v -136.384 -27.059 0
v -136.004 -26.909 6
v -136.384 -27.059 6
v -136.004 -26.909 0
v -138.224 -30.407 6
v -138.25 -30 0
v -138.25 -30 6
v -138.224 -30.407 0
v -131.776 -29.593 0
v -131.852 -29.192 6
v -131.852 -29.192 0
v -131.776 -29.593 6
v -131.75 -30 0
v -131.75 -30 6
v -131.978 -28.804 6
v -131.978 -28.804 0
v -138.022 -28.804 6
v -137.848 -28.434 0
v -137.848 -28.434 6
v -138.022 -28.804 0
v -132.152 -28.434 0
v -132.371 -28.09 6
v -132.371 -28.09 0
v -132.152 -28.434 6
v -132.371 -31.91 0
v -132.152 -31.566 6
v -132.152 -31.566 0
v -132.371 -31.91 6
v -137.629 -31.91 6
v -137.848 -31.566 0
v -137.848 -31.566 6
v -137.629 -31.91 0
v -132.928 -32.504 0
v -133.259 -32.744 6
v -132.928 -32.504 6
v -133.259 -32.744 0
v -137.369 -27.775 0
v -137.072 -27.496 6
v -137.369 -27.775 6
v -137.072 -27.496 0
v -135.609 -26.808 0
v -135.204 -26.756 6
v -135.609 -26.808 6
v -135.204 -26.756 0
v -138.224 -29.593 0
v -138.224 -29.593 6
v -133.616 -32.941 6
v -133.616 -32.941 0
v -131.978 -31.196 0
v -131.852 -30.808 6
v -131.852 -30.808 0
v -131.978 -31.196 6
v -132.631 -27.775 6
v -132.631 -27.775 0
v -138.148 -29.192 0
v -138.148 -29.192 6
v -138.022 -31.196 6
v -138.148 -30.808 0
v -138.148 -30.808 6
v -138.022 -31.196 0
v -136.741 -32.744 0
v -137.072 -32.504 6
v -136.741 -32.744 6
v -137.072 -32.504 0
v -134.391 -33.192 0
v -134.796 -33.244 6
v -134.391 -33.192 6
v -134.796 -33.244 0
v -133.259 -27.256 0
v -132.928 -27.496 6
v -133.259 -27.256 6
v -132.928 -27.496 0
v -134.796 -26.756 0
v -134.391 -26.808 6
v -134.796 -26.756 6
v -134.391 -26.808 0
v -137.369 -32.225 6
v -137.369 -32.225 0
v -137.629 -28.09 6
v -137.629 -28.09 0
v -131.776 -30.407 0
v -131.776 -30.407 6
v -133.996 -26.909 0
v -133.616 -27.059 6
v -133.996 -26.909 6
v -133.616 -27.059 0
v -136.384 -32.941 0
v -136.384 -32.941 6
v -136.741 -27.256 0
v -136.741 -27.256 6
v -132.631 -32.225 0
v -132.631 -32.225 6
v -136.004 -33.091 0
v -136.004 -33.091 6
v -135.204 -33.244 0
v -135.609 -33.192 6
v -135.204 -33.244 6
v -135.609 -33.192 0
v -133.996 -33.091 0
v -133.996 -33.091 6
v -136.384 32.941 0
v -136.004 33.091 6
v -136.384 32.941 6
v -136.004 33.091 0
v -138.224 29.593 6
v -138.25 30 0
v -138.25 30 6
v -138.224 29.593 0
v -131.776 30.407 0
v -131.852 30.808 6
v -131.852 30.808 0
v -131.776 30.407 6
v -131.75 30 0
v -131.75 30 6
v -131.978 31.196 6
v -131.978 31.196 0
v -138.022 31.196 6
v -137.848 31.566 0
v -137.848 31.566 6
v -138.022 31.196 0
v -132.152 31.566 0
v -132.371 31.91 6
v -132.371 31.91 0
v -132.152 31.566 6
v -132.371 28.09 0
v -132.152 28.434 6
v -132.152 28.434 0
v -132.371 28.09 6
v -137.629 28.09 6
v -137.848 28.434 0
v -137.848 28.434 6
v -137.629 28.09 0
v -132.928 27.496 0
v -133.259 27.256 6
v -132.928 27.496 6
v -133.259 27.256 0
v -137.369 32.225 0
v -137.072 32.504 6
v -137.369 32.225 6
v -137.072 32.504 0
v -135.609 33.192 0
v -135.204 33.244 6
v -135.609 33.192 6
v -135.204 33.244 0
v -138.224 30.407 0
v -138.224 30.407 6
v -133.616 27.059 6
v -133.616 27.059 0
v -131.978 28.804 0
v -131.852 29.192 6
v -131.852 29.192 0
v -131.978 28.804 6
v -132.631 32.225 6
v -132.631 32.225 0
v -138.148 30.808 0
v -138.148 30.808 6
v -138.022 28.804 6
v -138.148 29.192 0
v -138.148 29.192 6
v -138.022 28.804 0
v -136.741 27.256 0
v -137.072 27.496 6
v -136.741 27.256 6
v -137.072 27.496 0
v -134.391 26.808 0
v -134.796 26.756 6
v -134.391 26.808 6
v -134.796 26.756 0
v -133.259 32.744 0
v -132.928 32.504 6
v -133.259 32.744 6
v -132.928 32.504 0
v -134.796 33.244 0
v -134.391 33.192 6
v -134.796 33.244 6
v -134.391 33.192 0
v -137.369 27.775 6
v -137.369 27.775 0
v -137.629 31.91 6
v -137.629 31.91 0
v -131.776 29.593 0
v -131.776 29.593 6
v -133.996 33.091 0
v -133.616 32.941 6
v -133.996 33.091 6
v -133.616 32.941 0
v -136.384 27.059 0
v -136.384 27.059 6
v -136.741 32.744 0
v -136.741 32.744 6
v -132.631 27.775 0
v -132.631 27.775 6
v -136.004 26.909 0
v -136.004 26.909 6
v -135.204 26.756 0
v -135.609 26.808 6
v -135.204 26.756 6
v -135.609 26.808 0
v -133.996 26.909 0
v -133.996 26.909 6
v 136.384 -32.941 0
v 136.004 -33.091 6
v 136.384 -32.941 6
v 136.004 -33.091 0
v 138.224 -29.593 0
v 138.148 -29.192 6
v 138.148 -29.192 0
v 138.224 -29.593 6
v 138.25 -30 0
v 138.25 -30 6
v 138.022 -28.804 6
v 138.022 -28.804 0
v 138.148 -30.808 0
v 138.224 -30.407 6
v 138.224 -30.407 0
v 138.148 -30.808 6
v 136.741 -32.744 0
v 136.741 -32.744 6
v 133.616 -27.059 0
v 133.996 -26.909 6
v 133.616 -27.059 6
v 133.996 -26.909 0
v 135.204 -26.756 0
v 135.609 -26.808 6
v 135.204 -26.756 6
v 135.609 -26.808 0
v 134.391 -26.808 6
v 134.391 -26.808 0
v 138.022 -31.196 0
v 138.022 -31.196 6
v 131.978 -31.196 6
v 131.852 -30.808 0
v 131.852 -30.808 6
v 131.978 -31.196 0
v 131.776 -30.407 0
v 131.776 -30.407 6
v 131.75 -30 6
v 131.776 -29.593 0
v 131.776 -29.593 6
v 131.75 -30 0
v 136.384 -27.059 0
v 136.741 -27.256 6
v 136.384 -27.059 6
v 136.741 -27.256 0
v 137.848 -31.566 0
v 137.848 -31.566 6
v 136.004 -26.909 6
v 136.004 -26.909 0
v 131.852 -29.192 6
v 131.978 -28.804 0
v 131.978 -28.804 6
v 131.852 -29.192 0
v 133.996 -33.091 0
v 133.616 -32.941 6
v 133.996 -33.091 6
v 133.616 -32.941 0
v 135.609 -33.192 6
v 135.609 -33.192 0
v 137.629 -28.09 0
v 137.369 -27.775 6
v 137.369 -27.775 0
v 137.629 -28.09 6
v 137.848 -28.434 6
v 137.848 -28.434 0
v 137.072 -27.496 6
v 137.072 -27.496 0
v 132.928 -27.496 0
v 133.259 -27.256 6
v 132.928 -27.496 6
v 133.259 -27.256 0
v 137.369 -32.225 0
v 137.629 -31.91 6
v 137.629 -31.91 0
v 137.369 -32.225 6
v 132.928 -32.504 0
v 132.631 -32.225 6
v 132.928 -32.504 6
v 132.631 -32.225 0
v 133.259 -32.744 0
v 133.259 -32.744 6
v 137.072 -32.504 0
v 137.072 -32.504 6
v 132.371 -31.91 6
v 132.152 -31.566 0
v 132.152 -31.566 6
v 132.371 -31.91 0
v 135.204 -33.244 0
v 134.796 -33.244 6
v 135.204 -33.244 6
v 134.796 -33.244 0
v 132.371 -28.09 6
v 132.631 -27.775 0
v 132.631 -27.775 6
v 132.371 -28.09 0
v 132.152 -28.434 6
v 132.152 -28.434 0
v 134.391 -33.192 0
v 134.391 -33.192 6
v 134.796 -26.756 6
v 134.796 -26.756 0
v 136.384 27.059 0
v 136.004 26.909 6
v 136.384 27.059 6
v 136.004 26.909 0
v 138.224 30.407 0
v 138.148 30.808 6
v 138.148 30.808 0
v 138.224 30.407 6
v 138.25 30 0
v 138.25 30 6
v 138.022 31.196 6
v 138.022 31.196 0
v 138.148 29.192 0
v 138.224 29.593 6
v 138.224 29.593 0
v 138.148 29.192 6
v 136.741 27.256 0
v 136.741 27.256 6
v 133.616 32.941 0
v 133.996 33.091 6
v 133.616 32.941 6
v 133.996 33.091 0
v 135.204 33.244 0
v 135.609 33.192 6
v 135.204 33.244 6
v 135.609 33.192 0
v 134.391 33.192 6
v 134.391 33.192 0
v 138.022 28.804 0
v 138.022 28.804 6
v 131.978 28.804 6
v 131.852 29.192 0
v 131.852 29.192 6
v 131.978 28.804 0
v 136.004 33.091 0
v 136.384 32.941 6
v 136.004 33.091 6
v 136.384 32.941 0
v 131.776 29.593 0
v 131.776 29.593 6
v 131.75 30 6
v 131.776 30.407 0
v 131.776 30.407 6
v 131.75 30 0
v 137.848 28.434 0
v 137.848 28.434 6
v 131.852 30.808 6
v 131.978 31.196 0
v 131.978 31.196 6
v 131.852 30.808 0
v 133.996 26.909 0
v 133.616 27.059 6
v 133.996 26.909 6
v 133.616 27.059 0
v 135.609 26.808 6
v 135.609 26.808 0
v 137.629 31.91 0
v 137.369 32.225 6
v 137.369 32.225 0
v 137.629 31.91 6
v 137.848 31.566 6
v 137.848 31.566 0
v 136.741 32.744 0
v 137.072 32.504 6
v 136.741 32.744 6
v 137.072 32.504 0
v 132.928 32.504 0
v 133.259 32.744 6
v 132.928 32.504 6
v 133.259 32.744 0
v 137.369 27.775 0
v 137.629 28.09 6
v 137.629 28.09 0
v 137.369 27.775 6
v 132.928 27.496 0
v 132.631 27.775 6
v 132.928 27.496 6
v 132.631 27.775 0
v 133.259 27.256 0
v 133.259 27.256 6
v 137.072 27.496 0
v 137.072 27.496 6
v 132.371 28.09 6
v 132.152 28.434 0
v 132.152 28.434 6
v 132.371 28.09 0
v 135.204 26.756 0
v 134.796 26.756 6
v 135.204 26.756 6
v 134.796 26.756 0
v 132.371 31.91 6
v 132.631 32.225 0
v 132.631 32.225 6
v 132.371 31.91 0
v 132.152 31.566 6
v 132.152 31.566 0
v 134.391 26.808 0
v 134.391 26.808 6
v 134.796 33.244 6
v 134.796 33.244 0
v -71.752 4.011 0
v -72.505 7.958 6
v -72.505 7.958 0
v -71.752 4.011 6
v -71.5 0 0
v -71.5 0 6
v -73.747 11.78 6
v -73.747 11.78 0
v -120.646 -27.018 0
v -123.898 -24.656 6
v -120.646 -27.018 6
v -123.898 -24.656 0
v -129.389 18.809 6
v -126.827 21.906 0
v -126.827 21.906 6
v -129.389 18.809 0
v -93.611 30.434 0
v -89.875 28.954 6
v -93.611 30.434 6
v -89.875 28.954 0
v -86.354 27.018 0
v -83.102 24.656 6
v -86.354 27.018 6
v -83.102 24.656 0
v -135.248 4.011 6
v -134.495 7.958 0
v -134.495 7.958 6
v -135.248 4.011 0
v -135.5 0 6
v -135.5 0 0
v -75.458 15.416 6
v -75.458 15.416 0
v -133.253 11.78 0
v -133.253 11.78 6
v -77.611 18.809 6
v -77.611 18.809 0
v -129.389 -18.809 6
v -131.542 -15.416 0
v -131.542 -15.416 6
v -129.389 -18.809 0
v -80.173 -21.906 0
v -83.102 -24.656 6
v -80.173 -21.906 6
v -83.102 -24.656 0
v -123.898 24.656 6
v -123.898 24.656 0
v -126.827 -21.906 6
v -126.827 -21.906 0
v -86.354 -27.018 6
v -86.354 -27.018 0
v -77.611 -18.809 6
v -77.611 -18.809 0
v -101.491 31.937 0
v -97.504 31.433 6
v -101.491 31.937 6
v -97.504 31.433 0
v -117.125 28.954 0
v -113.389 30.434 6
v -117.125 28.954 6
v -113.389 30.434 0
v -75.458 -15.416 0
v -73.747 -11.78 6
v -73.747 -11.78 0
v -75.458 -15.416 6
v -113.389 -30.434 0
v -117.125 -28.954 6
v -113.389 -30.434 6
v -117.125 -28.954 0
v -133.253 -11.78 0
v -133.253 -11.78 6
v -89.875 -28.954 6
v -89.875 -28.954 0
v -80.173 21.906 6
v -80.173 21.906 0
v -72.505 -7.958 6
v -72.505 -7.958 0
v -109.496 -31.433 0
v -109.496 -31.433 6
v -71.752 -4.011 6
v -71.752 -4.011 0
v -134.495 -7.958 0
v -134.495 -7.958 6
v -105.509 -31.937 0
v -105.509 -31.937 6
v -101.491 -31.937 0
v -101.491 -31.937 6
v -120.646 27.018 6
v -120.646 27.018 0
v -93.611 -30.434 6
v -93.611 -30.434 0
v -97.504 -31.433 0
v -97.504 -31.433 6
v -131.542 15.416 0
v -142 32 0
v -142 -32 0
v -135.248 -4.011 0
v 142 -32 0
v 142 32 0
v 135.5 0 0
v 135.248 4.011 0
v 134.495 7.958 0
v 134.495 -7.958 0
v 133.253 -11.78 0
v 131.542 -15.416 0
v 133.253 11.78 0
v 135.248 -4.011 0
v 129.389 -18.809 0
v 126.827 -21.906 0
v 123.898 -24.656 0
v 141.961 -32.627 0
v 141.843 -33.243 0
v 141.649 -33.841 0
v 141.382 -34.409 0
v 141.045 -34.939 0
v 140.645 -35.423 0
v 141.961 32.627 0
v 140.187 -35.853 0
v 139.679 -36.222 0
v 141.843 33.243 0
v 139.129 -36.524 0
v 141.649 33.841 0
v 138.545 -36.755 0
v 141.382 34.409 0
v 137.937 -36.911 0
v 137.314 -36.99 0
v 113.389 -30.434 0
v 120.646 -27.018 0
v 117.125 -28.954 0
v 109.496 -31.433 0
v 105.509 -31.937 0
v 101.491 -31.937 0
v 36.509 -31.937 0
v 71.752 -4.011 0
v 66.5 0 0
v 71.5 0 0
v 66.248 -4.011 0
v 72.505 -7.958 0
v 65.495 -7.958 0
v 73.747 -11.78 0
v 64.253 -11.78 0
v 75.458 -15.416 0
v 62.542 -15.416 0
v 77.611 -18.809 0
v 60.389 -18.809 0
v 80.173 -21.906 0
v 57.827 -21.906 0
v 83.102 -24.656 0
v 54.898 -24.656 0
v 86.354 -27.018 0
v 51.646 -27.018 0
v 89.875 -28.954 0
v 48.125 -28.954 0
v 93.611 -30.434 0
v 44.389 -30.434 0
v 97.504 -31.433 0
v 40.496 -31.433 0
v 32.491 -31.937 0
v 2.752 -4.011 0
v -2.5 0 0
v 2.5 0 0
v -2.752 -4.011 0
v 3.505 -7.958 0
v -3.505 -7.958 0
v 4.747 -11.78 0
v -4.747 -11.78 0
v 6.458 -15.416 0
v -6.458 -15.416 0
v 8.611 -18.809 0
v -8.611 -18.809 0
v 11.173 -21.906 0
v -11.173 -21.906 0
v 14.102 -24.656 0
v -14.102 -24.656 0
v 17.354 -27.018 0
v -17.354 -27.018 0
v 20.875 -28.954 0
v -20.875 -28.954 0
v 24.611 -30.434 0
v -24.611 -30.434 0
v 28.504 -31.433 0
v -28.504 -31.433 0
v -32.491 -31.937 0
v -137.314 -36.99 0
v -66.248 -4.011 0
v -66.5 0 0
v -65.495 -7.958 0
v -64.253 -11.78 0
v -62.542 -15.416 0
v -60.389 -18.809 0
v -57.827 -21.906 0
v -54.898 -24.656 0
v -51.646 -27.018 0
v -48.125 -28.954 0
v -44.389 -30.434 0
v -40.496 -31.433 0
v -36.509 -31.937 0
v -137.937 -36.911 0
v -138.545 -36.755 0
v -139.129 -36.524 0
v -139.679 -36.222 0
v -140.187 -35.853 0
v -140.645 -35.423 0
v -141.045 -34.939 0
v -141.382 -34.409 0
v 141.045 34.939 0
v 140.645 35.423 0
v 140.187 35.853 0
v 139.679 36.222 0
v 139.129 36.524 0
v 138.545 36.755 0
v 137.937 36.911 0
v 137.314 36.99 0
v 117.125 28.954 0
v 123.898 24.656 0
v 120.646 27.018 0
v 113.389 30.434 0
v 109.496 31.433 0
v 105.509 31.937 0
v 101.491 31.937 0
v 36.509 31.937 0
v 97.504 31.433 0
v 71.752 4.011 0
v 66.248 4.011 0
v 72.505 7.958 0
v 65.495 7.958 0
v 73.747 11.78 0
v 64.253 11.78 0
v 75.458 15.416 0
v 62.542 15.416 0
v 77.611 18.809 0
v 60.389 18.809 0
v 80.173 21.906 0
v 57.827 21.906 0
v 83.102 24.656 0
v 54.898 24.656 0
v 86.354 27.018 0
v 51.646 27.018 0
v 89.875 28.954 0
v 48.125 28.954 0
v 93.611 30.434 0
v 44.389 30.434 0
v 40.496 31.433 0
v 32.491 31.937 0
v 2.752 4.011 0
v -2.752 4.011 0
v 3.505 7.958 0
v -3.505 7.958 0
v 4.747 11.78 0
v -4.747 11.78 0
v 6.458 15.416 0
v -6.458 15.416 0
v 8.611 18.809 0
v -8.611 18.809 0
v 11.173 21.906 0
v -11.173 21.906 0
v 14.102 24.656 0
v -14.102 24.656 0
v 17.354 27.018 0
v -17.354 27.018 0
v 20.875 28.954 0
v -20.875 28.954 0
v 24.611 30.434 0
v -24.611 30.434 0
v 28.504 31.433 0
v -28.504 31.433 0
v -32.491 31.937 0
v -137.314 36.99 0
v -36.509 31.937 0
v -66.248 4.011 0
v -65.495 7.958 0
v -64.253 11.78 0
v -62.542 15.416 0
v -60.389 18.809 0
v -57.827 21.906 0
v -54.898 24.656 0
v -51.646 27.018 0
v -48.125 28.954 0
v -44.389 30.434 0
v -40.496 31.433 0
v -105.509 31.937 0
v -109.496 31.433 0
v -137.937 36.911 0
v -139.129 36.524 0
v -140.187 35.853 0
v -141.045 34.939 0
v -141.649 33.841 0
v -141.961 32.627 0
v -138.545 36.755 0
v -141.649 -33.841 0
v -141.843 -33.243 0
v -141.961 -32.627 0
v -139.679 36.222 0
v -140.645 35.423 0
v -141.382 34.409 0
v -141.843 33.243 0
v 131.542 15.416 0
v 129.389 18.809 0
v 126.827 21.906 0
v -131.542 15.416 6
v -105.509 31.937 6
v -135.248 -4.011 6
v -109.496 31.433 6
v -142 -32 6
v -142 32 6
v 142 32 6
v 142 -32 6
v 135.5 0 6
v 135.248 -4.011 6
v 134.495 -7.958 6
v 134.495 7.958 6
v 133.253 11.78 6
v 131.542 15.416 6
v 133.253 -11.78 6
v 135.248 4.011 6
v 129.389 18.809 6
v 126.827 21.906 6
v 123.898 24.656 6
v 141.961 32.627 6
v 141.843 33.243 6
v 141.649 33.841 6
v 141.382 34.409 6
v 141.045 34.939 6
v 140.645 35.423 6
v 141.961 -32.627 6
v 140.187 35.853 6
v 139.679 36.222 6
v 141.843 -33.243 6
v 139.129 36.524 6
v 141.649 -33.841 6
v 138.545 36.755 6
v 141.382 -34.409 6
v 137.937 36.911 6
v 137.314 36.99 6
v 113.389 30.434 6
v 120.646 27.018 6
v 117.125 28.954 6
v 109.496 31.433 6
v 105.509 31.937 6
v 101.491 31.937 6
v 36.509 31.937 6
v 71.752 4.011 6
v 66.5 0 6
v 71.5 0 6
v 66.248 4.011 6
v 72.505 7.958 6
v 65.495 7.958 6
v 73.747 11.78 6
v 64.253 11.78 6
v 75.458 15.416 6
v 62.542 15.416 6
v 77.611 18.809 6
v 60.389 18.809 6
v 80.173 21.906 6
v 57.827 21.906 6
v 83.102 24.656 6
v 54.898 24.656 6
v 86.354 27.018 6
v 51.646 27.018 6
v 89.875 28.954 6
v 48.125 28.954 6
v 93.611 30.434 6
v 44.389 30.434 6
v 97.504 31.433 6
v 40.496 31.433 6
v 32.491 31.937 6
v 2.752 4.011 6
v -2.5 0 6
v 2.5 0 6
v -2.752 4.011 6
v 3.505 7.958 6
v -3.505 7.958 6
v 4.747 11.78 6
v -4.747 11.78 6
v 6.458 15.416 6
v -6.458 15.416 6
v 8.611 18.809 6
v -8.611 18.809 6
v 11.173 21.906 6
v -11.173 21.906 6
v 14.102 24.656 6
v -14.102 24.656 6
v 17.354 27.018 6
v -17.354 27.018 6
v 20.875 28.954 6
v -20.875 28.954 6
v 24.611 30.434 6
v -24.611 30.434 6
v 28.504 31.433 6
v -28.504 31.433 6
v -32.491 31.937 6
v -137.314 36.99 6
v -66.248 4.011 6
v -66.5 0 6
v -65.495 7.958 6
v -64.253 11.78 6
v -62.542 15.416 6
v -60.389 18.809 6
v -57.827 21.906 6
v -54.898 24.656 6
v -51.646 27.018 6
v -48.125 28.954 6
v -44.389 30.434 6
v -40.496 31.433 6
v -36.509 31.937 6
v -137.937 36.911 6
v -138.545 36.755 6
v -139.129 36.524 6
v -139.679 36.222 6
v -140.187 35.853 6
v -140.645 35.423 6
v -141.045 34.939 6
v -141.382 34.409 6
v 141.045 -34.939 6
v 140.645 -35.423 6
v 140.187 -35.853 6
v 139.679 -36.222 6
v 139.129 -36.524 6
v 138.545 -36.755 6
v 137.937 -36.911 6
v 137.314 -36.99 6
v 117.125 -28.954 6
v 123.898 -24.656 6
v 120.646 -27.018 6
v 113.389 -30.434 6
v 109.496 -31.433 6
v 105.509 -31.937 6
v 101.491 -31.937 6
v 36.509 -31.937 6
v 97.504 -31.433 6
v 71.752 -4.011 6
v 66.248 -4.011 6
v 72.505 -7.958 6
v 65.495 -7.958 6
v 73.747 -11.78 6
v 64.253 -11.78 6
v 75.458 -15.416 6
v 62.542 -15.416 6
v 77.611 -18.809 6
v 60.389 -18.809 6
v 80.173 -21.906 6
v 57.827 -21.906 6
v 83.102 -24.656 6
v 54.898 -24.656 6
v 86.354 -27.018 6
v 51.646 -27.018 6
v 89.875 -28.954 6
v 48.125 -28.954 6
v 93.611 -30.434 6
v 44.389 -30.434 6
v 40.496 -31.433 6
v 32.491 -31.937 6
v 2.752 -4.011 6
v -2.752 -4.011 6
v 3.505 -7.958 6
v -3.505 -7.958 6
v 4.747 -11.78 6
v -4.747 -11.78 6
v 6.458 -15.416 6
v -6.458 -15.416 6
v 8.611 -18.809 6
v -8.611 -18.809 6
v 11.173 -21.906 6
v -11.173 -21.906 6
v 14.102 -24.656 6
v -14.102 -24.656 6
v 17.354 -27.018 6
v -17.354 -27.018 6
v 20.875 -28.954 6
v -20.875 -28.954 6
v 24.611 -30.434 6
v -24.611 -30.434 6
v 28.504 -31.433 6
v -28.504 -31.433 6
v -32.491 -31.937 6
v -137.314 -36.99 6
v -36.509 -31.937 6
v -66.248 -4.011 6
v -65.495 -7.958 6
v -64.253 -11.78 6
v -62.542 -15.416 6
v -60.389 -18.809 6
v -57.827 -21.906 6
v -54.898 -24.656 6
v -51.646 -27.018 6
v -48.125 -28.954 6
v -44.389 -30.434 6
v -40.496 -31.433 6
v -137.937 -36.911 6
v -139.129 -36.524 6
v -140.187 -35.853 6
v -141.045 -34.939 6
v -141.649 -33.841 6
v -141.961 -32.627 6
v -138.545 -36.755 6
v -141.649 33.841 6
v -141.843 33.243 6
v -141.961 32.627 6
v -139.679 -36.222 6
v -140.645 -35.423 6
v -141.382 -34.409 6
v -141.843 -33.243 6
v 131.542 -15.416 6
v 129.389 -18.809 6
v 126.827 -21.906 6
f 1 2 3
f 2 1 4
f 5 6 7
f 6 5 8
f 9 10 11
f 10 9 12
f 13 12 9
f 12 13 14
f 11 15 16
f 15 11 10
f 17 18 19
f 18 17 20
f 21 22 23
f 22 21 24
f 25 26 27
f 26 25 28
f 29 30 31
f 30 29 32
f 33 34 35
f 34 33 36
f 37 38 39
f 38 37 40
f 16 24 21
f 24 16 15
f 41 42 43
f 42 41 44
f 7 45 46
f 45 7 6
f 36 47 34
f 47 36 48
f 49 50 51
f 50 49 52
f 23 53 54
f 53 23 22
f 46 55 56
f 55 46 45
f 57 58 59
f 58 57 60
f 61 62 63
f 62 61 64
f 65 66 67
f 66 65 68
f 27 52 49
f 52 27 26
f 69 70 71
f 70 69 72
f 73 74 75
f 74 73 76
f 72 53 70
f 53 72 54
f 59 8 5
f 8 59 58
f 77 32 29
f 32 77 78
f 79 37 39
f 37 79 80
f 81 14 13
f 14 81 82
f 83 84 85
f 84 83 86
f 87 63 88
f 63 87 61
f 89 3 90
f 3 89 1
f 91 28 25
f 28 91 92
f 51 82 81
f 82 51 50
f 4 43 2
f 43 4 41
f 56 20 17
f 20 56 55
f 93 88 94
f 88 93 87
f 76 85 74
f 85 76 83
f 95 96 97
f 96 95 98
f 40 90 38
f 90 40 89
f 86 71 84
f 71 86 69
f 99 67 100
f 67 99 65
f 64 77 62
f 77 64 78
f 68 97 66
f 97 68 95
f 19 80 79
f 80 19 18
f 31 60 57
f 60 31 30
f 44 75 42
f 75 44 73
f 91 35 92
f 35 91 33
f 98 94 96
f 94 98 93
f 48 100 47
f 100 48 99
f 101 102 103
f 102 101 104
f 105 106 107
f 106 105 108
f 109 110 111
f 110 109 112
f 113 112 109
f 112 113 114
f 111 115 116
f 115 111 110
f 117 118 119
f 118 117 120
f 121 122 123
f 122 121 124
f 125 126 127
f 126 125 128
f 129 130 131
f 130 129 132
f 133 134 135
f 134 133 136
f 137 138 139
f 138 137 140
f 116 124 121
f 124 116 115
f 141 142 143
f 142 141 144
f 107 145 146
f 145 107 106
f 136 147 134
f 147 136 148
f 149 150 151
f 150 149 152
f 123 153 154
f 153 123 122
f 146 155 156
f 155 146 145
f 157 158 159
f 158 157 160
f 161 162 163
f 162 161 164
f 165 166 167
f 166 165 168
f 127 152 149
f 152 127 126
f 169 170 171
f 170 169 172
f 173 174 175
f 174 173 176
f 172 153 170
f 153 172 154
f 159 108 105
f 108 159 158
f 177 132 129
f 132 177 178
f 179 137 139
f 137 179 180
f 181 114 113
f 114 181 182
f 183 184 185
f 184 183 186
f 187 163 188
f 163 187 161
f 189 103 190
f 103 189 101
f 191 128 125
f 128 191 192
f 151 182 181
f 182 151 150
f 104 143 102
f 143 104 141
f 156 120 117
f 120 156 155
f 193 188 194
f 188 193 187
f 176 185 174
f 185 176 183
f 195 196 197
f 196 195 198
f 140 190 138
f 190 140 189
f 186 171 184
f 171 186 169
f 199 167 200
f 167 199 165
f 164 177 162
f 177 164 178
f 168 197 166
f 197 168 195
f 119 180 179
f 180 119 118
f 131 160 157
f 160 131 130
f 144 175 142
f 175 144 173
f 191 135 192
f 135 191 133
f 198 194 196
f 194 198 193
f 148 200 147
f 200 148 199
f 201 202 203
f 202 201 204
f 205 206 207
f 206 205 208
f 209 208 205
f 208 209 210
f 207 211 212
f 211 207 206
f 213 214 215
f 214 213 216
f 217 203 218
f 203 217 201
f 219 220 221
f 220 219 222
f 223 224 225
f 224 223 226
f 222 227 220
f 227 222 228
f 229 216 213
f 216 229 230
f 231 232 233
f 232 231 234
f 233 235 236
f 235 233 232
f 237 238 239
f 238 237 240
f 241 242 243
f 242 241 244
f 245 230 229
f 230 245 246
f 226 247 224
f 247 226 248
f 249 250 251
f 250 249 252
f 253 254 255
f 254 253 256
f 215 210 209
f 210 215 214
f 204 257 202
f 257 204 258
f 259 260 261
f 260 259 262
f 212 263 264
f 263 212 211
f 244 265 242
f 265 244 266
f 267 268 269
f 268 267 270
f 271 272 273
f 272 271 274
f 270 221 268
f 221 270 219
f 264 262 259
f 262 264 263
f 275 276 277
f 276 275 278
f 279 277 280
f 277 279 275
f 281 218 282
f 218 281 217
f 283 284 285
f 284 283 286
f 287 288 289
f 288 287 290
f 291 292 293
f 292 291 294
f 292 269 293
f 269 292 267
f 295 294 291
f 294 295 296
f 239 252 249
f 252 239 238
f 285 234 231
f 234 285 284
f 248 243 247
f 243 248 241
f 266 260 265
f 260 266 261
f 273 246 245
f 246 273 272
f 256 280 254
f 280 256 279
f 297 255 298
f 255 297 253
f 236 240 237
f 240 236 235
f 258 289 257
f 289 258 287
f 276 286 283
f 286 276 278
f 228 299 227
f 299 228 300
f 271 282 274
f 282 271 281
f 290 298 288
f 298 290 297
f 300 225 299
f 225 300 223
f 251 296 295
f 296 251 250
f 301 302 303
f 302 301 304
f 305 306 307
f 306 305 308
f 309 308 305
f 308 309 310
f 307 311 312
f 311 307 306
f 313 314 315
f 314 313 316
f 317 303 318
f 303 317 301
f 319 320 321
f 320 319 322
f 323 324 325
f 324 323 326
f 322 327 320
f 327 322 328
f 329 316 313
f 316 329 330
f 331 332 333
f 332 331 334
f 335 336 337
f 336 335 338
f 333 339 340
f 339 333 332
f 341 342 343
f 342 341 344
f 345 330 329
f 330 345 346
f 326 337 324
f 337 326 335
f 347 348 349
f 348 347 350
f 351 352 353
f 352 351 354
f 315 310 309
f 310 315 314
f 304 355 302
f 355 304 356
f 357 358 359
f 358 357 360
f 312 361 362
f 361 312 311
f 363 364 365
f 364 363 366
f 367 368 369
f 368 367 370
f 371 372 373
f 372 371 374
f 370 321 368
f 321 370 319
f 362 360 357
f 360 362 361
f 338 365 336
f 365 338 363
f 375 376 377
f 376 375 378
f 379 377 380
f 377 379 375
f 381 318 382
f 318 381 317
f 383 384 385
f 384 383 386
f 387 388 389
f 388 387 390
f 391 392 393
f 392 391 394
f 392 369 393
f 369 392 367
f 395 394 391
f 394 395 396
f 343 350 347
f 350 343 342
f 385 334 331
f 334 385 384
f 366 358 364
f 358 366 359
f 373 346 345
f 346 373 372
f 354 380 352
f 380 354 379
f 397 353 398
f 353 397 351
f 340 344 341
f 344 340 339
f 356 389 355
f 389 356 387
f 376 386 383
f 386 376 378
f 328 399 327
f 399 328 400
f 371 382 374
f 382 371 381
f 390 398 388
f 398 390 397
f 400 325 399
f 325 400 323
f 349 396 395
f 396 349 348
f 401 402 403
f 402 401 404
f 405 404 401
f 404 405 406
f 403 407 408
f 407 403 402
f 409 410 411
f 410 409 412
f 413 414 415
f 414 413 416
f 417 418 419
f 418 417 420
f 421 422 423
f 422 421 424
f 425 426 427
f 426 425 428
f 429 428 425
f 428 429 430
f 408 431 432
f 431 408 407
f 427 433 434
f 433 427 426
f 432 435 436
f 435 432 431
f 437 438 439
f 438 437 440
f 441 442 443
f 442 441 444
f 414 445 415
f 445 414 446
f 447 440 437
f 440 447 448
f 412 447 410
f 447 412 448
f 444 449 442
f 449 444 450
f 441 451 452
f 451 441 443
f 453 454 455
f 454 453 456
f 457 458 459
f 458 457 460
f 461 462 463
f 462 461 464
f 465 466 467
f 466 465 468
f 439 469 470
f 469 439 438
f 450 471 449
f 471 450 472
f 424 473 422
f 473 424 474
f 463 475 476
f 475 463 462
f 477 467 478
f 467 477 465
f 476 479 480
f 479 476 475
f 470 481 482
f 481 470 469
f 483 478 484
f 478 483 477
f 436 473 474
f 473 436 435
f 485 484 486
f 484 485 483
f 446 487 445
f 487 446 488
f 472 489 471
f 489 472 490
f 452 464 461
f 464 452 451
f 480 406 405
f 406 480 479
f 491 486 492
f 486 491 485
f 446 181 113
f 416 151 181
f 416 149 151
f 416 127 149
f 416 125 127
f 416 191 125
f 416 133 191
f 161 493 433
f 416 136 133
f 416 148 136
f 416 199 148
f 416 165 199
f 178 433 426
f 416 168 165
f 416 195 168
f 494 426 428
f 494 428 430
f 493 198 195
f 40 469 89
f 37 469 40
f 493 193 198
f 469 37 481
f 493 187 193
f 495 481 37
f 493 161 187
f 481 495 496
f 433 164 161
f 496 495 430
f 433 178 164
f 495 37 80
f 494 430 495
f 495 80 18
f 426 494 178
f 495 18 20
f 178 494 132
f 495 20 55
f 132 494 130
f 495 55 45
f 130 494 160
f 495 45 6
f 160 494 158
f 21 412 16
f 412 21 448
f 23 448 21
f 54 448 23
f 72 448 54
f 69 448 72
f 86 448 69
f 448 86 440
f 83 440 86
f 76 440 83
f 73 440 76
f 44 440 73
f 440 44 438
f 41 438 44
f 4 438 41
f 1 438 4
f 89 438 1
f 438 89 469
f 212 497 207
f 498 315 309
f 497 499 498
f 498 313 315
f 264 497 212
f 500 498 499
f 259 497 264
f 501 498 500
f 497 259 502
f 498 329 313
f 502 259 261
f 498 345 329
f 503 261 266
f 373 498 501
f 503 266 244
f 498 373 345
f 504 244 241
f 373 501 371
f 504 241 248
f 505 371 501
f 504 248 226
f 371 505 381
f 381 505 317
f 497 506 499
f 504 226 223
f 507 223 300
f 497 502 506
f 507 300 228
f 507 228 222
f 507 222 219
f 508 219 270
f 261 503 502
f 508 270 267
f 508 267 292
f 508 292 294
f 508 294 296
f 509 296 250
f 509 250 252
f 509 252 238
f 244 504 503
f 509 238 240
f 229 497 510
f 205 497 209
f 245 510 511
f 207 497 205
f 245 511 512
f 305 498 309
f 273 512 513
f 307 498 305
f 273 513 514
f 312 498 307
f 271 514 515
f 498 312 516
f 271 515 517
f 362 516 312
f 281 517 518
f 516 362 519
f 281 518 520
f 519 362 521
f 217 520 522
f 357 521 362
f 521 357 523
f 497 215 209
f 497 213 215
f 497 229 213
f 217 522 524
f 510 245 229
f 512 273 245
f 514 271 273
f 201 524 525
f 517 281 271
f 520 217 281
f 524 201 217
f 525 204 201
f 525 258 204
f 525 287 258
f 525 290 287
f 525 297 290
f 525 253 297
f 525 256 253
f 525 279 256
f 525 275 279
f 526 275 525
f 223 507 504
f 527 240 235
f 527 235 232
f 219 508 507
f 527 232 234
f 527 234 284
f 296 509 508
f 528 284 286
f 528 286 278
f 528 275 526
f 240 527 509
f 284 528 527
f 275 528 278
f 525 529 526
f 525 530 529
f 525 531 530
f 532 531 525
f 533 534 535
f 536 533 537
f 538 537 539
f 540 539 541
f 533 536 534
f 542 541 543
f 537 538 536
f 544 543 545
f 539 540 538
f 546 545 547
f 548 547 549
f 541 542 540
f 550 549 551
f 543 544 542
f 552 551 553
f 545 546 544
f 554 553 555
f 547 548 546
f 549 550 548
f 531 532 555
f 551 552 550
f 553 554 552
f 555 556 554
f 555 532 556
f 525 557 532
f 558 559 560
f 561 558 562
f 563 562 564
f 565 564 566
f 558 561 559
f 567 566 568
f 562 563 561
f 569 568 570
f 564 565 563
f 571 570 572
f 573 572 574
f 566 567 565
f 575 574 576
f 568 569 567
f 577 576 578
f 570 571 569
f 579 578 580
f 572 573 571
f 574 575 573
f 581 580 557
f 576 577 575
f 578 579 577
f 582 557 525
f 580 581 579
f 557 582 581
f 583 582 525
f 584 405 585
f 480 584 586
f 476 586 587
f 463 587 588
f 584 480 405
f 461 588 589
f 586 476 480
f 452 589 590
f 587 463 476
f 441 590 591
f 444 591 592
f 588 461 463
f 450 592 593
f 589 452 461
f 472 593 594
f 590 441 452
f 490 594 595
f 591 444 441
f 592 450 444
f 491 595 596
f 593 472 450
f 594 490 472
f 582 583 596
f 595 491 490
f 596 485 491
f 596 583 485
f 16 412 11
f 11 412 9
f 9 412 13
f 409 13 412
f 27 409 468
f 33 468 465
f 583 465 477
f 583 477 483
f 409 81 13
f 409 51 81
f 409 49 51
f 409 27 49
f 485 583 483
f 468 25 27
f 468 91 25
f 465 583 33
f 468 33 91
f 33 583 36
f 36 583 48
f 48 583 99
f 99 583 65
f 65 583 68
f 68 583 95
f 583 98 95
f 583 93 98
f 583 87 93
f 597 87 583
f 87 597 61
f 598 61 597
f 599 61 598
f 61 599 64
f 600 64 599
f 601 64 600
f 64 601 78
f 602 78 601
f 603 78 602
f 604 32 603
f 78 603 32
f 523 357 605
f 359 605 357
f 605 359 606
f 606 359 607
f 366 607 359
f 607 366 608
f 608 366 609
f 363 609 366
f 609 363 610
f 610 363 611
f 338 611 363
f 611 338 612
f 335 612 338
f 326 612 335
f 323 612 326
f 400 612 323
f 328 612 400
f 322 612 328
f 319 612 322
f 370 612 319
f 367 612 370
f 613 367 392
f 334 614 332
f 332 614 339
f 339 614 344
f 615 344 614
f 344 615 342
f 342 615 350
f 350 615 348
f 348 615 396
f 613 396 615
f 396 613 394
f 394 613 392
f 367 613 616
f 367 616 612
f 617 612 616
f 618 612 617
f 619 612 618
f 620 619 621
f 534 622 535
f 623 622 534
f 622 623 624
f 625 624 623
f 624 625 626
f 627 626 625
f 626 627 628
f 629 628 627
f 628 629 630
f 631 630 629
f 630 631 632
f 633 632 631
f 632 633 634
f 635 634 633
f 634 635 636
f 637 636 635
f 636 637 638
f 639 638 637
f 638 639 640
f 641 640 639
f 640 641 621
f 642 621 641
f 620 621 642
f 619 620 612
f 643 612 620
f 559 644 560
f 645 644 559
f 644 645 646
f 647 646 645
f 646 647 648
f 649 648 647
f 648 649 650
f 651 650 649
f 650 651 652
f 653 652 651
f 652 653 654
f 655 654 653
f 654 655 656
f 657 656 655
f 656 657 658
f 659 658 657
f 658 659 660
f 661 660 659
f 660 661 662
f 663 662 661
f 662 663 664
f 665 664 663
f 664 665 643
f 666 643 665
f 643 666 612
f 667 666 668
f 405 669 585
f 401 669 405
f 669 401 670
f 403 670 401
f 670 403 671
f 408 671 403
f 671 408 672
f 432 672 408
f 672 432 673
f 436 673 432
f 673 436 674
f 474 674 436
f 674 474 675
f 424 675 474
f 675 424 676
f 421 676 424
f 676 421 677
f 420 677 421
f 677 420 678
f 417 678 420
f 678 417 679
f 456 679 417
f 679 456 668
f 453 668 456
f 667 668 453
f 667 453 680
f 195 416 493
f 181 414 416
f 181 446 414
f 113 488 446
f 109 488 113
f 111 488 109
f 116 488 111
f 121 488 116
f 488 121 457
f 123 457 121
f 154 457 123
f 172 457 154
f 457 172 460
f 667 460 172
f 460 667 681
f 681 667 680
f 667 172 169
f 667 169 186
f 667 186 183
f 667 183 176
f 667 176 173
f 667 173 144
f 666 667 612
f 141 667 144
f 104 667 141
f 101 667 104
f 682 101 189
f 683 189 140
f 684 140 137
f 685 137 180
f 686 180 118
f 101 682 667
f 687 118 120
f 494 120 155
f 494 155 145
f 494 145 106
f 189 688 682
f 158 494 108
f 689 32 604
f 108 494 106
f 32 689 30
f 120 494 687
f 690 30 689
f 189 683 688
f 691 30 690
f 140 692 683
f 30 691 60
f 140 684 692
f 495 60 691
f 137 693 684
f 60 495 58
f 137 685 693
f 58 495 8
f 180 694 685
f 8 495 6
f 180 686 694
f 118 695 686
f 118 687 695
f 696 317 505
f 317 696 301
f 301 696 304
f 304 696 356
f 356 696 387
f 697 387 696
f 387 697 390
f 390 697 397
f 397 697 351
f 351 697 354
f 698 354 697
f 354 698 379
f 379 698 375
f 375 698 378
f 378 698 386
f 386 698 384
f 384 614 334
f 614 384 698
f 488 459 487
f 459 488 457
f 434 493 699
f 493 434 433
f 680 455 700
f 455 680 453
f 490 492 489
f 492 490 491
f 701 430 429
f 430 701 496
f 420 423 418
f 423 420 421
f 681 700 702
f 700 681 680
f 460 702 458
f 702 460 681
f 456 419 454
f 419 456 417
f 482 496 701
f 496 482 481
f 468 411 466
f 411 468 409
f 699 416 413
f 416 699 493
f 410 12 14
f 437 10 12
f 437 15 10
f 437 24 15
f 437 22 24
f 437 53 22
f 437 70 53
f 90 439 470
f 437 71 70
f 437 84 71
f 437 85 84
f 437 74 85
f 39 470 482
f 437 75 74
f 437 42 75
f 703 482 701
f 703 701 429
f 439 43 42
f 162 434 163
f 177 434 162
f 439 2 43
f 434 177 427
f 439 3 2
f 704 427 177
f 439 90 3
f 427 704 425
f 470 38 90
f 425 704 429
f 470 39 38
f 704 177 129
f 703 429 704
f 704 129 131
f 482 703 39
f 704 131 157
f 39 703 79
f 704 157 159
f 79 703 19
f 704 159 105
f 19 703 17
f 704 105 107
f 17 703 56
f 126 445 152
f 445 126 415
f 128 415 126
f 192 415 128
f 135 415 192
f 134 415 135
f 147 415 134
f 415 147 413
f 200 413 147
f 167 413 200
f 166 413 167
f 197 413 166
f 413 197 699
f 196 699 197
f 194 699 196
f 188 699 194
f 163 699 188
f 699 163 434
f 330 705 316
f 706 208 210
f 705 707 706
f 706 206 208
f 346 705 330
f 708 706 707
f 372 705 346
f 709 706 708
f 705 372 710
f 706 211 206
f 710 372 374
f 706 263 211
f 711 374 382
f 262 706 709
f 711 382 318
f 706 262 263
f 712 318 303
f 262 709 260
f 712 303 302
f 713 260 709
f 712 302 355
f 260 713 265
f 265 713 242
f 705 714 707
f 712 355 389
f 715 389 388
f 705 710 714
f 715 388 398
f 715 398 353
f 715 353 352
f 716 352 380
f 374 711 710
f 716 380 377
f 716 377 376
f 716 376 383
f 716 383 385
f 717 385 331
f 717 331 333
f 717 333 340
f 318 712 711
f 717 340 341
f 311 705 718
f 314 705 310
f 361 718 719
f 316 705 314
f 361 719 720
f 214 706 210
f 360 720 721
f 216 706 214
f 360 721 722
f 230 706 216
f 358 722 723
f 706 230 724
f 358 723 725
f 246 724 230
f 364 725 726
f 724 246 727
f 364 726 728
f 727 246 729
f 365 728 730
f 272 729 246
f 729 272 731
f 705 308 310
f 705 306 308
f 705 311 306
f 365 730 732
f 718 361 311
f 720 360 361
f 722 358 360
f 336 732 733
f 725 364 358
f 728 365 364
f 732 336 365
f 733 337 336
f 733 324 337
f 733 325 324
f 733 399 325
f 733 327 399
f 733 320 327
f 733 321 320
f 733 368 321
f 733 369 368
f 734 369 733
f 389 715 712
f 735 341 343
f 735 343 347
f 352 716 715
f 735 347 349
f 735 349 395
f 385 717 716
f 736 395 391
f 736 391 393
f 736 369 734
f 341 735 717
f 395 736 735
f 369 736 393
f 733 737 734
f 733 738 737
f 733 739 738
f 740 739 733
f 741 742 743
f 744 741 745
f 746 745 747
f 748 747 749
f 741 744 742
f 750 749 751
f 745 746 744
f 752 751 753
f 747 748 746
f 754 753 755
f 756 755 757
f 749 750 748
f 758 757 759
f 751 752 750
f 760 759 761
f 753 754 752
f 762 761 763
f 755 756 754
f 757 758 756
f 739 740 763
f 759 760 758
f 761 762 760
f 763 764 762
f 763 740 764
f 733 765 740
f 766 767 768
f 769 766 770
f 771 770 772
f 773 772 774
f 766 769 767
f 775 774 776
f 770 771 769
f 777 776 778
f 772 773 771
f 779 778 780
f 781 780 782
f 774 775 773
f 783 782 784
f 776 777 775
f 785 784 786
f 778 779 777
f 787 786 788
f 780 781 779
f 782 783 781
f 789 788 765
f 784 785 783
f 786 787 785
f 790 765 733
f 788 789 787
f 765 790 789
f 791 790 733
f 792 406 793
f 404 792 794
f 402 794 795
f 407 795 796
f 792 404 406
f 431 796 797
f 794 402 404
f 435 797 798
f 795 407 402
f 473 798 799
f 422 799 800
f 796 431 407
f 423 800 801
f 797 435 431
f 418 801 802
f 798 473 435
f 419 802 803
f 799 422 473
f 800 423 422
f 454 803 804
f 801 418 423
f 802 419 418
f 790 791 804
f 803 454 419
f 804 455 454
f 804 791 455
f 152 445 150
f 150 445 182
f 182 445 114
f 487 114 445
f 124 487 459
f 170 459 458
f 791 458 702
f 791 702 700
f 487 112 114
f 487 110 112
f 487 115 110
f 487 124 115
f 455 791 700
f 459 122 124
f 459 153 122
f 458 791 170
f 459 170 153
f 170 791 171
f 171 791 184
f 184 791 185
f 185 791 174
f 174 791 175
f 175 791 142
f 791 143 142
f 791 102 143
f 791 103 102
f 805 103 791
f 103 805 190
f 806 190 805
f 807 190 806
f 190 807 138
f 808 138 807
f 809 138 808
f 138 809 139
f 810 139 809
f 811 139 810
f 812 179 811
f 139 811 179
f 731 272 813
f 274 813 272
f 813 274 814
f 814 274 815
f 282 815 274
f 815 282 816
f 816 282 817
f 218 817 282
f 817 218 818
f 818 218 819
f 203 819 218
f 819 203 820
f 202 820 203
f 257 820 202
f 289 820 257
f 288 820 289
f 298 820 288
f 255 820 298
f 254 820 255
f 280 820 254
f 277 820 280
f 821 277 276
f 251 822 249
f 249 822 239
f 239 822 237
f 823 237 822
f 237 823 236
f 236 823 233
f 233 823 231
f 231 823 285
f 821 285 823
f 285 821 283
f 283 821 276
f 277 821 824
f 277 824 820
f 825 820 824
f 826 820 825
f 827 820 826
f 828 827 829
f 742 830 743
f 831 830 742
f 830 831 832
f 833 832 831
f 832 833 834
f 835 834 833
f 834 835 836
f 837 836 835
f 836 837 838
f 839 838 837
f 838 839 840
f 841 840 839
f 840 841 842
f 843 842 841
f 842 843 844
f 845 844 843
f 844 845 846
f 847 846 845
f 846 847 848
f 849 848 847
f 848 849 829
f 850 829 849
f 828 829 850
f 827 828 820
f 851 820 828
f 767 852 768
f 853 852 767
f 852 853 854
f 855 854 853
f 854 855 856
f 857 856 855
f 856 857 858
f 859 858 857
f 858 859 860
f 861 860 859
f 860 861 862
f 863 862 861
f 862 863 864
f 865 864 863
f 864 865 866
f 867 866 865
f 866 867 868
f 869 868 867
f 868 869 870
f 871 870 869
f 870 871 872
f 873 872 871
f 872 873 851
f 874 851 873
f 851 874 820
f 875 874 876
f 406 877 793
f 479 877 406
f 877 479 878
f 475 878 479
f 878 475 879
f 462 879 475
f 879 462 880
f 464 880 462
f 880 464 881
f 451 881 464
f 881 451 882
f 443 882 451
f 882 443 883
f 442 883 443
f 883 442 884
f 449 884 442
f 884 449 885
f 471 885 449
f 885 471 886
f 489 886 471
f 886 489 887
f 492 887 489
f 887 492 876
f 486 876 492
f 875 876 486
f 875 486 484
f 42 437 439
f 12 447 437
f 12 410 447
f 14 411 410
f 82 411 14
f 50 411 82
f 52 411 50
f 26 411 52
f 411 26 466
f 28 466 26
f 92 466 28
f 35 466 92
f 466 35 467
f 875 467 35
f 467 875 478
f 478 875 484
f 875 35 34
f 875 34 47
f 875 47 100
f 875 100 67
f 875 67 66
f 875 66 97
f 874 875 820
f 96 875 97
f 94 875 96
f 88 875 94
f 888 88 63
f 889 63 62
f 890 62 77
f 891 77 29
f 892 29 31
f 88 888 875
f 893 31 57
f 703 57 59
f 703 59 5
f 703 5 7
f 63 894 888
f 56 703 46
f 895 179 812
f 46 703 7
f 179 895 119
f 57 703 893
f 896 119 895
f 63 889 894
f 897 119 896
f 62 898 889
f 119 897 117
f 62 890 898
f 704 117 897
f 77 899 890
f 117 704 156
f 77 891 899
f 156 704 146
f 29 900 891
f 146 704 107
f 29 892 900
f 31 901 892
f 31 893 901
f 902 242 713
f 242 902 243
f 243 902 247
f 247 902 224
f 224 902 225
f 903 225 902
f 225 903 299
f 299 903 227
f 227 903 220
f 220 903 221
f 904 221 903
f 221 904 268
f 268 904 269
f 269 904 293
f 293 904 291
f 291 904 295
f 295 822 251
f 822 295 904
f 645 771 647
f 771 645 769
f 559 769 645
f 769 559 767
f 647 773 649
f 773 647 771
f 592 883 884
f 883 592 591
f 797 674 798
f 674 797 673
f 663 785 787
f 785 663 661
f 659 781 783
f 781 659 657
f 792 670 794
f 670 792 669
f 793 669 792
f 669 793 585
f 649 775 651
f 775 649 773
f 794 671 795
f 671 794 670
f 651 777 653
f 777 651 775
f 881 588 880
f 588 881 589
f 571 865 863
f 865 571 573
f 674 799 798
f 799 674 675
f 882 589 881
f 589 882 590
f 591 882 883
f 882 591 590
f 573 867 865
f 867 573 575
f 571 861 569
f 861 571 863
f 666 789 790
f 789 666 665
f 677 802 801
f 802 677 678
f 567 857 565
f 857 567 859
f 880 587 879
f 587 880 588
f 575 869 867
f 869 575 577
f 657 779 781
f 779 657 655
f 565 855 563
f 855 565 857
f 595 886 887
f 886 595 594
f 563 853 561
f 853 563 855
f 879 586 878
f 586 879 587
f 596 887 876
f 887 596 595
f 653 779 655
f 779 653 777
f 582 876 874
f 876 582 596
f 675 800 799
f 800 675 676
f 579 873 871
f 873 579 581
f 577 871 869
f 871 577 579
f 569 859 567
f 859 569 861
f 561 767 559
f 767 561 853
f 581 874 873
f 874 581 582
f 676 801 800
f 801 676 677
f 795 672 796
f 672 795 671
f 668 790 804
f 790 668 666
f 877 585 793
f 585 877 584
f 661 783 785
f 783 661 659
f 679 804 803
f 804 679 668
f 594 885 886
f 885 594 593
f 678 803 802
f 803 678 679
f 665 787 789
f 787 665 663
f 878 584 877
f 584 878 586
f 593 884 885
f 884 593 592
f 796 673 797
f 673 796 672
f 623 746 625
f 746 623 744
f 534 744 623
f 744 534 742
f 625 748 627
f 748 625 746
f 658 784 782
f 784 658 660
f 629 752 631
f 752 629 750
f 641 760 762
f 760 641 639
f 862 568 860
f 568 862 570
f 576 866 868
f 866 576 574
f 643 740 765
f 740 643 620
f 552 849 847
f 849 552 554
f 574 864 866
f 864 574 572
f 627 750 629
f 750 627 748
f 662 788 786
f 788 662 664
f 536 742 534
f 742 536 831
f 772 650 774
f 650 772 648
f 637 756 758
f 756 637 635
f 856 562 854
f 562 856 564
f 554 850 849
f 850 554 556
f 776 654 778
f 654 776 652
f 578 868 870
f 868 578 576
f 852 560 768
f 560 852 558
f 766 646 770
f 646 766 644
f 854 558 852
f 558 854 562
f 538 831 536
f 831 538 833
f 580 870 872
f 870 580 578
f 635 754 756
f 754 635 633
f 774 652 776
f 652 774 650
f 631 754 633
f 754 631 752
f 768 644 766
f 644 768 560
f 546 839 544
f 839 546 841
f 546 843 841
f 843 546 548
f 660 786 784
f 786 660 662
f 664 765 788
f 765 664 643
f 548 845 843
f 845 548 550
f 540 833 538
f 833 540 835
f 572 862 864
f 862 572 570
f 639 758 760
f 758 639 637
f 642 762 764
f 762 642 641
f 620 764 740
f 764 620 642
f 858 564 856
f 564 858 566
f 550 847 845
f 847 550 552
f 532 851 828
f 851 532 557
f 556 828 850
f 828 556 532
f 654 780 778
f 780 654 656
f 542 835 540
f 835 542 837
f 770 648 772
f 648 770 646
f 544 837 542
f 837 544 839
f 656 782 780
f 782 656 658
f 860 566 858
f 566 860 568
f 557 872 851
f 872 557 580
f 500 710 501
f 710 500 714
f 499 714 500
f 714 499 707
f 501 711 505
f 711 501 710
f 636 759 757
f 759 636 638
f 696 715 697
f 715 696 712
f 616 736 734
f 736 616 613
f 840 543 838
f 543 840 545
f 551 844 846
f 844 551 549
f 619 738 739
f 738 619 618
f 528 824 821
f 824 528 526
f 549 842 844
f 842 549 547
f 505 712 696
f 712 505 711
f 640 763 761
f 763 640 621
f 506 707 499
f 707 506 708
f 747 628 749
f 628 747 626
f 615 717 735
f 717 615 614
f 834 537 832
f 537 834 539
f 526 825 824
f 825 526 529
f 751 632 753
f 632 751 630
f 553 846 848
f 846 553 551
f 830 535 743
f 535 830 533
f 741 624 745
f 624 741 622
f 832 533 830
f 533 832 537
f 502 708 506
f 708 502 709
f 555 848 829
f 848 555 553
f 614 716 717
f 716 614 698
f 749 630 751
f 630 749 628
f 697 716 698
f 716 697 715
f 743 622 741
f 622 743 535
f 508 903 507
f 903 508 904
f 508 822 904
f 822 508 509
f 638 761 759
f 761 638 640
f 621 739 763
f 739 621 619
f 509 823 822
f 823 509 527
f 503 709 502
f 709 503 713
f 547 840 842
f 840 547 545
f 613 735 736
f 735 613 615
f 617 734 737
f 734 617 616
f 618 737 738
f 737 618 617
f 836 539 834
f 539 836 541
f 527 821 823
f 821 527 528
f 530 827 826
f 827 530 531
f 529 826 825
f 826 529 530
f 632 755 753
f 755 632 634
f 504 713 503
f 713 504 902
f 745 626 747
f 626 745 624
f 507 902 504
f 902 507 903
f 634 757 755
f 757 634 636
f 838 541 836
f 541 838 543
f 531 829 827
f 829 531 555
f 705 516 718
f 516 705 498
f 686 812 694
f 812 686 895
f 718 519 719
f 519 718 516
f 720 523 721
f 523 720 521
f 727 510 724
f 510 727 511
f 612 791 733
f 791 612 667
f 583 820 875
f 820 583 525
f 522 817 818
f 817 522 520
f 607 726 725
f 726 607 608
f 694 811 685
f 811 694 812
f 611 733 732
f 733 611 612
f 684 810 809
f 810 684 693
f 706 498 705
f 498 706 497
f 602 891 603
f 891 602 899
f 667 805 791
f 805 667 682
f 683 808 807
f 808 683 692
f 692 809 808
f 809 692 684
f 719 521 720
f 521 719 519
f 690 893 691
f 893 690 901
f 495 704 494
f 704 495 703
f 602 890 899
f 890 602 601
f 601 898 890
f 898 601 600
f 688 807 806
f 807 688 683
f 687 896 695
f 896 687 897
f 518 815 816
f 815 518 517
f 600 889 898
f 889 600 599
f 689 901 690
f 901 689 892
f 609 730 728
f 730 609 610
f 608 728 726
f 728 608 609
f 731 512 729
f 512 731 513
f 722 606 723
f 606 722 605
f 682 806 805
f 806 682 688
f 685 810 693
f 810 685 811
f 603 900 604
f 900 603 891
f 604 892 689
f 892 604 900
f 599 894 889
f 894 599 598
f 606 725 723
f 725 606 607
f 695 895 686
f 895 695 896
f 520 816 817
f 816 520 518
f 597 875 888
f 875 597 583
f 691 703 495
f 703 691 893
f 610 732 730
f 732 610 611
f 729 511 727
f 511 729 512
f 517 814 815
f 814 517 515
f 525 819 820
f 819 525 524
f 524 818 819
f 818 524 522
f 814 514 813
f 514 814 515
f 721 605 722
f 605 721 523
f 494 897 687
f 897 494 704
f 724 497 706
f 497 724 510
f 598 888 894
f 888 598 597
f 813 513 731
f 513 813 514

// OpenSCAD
$fn = 50;


difference() {
	union() {
		hull() {
			translate(v = [-137.0000000000, 32.0000000000, 0]) {
				cylinder(h = 6, r = 5);
			}
			translate(v = [137.0000000000, 32.0000000000, 0]) {
				cylinder(h = 6, r = 5);
			}
			translate(v = [-137.0000000000, -32.0000000000, 0]) {
				cylinder(h = 6, r = 5);
			}
			translate(v = [137.0000000000, -32.0000000000, 0]) {
				cylinder(h = 6, r = 5);
			}
		}
	}
	union() {
		#translate(v = [-135.0000000000, -30.0000000000, -100.0000000000]) {
			cylinder(h = 200, r = 3.2500000000);
		}
		#translate(v = [-135.0000000000, 30.0000000000, -100.0000000000]) {
			cylinder(h = 200, r = 3.2500000000);
		}
		#translate(v = [135.0000000000, -30.0000000000, -100.0000000000]) {
			cylinder(h = 200, r = 3.2500000000);
		}
		#translate(v = [135.0000000000, 30.0000000000, -100.0000000000]) {
			cylinder(h = 200, r = 3.2500000000);
		}
		#translate(v = [-103.5000000000, 0, 0]) {
			cylinder(h = 6, r = 32.0000000000);
		}
		#translate(v = [-34.5000000000, 0, 0]) {
			cylinder(h = 6, r = 32.0000000000);
		}
		#translate(v = [34.5000000000, 0, 0]) {
			cylinder(h = 6, r = 32.0000000000);
		}
		#translate(v = [103.5000000000, 0, 0]) {
			cylinder(h = 6, r = 32.0000000000);
		}
	}
}
